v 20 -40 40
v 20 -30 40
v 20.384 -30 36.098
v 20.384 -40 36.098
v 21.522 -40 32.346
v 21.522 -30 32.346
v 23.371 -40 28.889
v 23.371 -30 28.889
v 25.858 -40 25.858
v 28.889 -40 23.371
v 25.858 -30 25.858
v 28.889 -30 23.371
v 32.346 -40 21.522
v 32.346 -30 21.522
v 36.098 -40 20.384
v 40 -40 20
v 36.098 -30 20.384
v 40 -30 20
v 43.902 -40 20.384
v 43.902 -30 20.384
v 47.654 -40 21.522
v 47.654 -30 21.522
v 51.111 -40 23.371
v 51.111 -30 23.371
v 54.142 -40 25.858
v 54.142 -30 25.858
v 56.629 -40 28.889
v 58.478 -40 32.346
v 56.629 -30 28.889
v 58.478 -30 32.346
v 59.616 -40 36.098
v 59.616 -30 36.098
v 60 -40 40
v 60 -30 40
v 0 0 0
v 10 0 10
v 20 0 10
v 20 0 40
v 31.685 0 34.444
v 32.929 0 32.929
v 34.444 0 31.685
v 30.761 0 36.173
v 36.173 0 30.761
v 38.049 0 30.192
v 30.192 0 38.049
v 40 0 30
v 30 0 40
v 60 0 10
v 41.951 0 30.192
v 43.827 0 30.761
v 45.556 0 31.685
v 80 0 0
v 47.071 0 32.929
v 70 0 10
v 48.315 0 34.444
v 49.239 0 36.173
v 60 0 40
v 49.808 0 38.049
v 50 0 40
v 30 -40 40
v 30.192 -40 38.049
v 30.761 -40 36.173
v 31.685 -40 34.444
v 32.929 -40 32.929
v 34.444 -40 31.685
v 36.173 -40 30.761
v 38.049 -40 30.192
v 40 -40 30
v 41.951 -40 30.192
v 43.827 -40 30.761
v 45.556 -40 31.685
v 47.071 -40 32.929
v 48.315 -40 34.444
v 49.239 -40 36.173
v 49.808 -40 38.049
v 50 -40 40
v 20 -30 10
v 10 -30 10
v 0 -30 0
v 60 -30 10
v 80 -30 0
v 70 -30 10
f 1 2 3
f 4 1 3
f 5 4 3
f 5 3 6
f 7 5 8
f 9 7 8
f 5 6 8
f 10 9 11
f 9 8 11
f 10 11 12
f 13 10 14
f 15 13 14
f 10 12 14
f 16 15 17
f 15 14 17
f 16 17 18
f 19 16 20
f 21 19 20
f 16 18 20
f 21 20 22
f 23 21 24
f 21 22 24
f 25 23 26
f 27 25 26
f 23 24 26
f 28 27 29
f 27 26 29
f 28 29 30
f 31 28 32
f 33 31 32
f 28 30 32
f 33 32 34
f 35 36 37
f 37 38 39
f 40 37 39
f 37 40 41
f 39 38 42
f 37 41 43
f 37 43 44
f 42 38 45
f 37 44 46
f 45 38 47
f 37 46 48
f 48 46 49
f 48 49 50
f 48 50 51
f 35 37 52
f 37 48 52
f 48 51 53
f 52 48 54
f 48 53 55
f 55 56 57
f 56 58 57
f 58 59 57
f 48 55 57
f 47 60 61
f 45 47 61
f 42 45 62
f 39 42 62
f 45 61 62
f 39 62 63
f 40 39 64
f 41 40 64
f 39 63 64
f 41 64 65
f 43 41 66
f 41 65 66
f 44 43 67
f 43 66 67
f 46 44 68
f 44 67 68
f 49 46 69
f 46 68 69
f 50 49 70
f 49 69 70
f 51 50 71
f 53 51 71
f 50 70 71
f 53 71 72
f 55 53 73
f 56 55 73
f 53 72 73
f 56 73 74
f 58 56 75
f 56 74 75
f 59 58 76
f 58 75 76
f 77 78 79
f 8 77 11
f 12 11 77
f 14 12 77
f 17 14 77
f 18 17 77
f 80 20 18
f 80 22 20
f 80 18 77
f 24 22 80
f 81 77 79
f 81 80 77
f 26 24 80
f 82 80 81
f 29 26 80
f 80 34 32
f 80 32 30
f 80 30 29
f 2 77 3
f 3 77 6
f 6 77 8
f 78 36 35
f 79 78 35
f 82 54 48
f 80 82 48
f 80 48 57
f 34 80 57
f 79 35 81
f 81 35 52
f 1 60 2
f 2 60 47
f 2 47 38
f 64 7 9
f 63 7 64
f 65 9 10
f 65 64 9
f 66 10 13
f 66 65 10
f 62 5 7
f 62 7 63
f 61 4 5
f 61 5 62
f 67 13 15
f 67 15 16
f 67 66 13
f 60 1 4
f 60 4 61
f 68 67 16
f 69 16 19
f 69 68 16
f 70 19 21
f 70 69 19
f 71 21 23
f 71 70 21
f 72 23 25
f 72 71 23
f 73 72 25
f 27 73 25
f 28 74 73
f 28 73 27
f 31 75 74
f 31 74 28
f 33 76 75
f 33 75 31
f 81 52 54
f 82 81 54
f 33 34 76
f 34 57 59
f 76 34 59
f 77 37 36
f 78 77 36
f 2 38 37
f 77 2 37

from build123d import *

# Parameters (mm, degrees)
F1_DEPTH = 30
F3_DEPTH = 10
F5_DEPTH = 43.3


with BuildPart() as f1:
    # F0 (on Front) → F1 (new body)
    with BuildSketch(Plane.XZ):
        Polygon((10, 10), (0, 0), (80, 0), (70, 10), (60, 10), (60, 40), (20, 40), (20, 10), align=None)
    extrude(amount=F1_DEPTH)

    # F2 (on face) → F3 (join)
    with BuildSketch(Plane.XZ.offset(30)):
        with BuildLine():
            Line((60, 40), (20, 40))
            ThreePointArc((20, 40), (40, 20), (60, 40))
        make_face()
    extrude(amount=F3_DEPTH)

    # F4 (on face) → F5 (cut)
    with BuildSketch(Plane.XZ.offset(40)):
        with BuildLine():
            ThreePointArc((30, 40), (40, 30), (50, 40))
            Line((50, 40), (30, 40))
        make_face()
    extrude(amount=-F5_DEPTH, mode=Mode.SUBTRACT)


solid = f1.part
